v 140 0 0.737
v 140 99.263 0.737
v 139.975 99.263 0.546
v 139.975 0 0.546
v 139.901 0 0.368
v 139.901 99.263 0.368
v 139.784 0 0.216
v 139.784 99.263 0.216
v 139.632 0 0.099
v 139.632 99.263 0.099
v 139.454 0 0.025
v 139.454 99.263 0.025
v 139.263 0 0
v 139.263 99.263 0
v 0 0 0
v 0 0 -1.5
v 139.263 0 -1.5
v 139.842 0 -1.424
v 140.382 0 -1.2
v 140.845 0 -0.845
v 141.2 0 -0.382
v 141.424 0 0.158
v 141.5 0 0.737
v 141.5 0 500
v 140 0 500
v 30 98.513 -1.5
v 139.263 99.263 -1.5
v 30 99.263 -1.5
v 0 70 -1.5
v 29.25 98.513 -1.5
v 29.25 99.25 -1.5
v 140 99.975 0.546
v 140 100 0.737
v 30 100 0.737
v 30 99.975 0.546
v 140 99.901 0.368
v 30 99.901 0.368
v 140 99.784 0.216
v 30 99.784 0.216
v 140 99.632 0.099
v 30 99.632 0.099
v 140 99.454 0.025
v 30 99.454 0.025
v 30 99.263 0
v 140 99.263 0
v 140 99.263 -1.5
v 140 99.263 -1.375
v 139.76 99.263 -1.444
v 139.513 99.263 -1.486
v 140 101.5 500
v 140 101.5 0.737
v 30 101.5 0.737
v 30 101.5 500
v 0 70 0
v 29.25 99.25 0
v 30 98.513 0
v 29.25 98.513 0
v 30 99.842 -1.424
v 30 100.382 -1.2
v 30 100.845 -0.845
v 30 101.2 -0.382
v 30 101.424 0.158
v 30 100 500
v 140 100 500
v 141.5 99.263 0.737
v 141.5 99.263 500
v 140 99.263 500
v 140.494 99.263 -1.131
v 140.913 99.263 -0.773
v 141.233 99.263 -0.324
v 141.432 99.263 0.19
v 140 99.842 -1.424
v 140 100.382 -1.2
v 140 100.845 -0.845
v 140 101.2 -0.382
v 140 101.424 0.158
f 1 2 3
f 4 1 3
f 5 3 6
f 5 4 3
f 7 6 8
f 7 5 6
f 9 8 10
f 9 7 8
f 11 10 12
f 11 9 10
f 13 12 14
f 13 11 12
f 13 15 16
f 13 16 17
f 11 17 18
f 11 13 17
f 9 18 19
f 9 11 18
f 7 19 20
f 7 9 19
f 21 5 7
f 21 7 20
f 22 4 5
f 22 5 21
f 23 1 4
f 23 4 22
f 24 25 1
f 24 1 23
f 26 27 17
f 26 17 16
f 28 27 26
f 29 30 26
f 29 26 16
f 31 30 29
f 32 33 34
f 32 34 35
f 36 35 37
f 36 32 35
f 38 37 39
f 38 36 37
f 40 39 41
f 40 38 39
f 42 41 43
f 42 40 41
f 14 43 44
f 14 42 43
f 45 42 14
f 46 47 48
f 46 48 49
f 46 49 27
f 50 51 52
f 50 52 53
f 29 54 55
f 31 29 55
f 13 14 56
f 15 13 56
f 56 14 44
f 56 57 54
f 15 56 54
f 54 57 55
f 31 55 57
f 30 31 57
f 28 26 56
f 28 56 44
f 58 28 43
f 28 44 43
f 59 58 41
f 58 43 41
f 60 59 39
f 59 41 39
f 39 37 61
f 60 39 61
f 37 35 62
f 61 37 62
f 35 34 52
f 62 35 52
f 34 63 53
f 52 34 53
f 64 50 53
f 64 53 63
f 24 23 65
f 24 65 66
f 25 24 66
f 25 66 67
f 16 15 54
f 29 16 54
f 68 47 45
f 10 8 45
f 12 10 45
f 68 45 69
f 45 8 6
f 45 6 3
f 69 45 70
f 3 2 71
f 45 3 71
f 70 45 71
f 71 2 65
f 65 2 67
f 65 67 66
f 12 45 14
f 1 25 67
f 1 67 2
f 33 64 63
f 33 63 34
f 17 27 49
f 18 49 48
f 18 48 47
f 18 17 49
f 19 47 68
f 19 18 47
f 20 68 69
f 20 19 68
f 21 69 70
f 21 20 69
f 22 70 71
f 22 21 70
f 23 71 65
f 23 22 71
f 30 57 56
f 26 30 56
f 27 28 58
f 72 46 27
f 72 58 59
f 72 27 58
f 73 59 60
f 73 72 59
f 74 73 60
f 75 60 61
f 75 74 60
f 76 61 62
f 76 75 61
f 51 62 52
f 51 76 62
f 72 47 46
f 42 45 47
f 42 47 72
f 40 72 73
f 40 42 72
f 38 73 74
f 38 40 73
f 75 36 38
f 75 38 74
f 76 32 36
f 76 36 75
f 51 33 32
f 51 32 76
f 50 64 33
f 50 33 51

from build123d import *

# Parameters (mm, degrees)
TABAN_FLAN_2_DEPTH            = 1.5
KENAR_FLAN_2_STRIP_W          = 7.4732
KENAR_FLAN_2_STRIP_H          = 1.5
KENAR_FLAN_2_STRIP_CUT_DEPTH  = 110
KENAR_FLAN_2_RELIEF_W         = 8.2232
KENAR_FLAN_2_RELIEF_H         = 0.75
KENAR_FLAN_2_RELIEF_CUT_DEPTH = 1.5
KENAR_FLAN_2_DEPTH            = 110
KENAR_FLAN_4_STRIP_W          = 7.4732
KENAR_FLAN_4_STRIP_H          = 1.5
KENAR_FLAN_4_STRIP_CUT_DEPTH  = 99.2634
KENAR_FLAN_4_DEPTH            = 99.2634


# Sheet-metal steps are written as plain solids
with BuildPart() as part:
    # Çizim1 → Taban-Flanş2 (new body)
    with BuildSketch(Plane.XY):
        Polygon((0, 0), (0, 70), (30, 100), (140, 100), (140, 0), align=None)
    extrude(amount=-TABAN_FLAN_2_DEPTH)

    # Kenar-Flanş2 strip (across the edge) → Kenar-Flanş2 strip cut (cut)
    with BuildSketch(Plane(origin=(140, 100, 0), x_dir=(0, -1, 0), z_dir=(-1, 0, 0))):
        with Locations((-3, -0.75)):
            Rectangle(KENAR_FLAN_2_STRIP_W, KENAR_FLAN_2_STRIP_H)
    extrude(amount=KENAR_FLAN_2_STRIP_CUT_DEPTH, mode=Mode.SUBTRACT)

    # Kenar-Flanş2 relief (on the sheet) → Kenar-Flanş2 relief cut (cut)
    with BuildSketch(Plane(origin=(140, 99.2634, 0), x_dir=(0, -1, 0), z_dir=(0, 0, 1))):
        with Locations((-3.3616, -110.375)):
            Rectangle(KENAR_FLAN_2_RELIEF_W, KENAR_FLAN_2_RELIEF_H)
    extrude(amount=-KENAR_FLAN_2_RELIEF_CUT_DEPTH, mode=Mode.SUBTRACT)

    # Kenar-Flanş2 section (across the edge) → Kenar-Flanş2 (add)
    with BuildSketch(Plane(origin=(140, 100, 0), x_dir=(0, -1, 0), z_dir=(-1, 0, 0))):
        with BuildLine():
            Line((-1.5, 0.7366), (-1.5, 500))
            Line((-1.5, 500), (0, 500))
            Line((0, 500), (0, 0.7366))
            ThreePointArc((0, 0.7366), (0.215745145, 0.215745145), (0.7366, 0))
            Line((0.7366, 0), (0.7366, -1.5))
            ThreePointArc((0.7366, -1.5), (-0.844915027, -0.844915027), (-1.5, 0.7366))
        make_face()
    extrude(amount=KENAR_FLAN_2_DEPTH)

    # Kenar-Flanş4 strip (across the edge) → Kenar-Flanş4 strip cut (cut)
    with BuildSketch(Plane(origin=(140, 0, 0), x_dir=(-1, 0, 0), z_dir=(0, 1, 0))):
        with Locations((-3, -0.75)):
            Rectangle(KENAR_FLAN_4_STRIP_W, KENAR_FLAN_4_STRIP_H)
    extrude(amount=KENAR_FLAN_4_STRIP_CUT_DEPTH, mode=Mode.SUBTRACT)

    # Kenar-Flanş4 section (across the edge) → Kenar-Flanş4 (add)
    with BuildSketch(Plane(origin=(140, 0, 0), x_dir=(-1, 0, 0), z_dir=(0, 1, 0))):
        with BuildLine():
            Line((-1.5, 0.7366), (-1.5, 500))
            Line((-1.5, 500), (0, 500))
            Line((0, 500), (0, 0.7366))
            ThreePointArc((0, 0.7366), (0.215745145, 0.215745145), (0.7366, 0))
            Line((0.7366, 0), (0.7366, -1.5))
            ThreePointArc((0.7366, -1.5), (-0.844915027, -0.844915027), (-1.5, 0.7366))
        make_face()
    extrude(amount=KENAR_FLAN_4_DEPTH)


solid = part.part
